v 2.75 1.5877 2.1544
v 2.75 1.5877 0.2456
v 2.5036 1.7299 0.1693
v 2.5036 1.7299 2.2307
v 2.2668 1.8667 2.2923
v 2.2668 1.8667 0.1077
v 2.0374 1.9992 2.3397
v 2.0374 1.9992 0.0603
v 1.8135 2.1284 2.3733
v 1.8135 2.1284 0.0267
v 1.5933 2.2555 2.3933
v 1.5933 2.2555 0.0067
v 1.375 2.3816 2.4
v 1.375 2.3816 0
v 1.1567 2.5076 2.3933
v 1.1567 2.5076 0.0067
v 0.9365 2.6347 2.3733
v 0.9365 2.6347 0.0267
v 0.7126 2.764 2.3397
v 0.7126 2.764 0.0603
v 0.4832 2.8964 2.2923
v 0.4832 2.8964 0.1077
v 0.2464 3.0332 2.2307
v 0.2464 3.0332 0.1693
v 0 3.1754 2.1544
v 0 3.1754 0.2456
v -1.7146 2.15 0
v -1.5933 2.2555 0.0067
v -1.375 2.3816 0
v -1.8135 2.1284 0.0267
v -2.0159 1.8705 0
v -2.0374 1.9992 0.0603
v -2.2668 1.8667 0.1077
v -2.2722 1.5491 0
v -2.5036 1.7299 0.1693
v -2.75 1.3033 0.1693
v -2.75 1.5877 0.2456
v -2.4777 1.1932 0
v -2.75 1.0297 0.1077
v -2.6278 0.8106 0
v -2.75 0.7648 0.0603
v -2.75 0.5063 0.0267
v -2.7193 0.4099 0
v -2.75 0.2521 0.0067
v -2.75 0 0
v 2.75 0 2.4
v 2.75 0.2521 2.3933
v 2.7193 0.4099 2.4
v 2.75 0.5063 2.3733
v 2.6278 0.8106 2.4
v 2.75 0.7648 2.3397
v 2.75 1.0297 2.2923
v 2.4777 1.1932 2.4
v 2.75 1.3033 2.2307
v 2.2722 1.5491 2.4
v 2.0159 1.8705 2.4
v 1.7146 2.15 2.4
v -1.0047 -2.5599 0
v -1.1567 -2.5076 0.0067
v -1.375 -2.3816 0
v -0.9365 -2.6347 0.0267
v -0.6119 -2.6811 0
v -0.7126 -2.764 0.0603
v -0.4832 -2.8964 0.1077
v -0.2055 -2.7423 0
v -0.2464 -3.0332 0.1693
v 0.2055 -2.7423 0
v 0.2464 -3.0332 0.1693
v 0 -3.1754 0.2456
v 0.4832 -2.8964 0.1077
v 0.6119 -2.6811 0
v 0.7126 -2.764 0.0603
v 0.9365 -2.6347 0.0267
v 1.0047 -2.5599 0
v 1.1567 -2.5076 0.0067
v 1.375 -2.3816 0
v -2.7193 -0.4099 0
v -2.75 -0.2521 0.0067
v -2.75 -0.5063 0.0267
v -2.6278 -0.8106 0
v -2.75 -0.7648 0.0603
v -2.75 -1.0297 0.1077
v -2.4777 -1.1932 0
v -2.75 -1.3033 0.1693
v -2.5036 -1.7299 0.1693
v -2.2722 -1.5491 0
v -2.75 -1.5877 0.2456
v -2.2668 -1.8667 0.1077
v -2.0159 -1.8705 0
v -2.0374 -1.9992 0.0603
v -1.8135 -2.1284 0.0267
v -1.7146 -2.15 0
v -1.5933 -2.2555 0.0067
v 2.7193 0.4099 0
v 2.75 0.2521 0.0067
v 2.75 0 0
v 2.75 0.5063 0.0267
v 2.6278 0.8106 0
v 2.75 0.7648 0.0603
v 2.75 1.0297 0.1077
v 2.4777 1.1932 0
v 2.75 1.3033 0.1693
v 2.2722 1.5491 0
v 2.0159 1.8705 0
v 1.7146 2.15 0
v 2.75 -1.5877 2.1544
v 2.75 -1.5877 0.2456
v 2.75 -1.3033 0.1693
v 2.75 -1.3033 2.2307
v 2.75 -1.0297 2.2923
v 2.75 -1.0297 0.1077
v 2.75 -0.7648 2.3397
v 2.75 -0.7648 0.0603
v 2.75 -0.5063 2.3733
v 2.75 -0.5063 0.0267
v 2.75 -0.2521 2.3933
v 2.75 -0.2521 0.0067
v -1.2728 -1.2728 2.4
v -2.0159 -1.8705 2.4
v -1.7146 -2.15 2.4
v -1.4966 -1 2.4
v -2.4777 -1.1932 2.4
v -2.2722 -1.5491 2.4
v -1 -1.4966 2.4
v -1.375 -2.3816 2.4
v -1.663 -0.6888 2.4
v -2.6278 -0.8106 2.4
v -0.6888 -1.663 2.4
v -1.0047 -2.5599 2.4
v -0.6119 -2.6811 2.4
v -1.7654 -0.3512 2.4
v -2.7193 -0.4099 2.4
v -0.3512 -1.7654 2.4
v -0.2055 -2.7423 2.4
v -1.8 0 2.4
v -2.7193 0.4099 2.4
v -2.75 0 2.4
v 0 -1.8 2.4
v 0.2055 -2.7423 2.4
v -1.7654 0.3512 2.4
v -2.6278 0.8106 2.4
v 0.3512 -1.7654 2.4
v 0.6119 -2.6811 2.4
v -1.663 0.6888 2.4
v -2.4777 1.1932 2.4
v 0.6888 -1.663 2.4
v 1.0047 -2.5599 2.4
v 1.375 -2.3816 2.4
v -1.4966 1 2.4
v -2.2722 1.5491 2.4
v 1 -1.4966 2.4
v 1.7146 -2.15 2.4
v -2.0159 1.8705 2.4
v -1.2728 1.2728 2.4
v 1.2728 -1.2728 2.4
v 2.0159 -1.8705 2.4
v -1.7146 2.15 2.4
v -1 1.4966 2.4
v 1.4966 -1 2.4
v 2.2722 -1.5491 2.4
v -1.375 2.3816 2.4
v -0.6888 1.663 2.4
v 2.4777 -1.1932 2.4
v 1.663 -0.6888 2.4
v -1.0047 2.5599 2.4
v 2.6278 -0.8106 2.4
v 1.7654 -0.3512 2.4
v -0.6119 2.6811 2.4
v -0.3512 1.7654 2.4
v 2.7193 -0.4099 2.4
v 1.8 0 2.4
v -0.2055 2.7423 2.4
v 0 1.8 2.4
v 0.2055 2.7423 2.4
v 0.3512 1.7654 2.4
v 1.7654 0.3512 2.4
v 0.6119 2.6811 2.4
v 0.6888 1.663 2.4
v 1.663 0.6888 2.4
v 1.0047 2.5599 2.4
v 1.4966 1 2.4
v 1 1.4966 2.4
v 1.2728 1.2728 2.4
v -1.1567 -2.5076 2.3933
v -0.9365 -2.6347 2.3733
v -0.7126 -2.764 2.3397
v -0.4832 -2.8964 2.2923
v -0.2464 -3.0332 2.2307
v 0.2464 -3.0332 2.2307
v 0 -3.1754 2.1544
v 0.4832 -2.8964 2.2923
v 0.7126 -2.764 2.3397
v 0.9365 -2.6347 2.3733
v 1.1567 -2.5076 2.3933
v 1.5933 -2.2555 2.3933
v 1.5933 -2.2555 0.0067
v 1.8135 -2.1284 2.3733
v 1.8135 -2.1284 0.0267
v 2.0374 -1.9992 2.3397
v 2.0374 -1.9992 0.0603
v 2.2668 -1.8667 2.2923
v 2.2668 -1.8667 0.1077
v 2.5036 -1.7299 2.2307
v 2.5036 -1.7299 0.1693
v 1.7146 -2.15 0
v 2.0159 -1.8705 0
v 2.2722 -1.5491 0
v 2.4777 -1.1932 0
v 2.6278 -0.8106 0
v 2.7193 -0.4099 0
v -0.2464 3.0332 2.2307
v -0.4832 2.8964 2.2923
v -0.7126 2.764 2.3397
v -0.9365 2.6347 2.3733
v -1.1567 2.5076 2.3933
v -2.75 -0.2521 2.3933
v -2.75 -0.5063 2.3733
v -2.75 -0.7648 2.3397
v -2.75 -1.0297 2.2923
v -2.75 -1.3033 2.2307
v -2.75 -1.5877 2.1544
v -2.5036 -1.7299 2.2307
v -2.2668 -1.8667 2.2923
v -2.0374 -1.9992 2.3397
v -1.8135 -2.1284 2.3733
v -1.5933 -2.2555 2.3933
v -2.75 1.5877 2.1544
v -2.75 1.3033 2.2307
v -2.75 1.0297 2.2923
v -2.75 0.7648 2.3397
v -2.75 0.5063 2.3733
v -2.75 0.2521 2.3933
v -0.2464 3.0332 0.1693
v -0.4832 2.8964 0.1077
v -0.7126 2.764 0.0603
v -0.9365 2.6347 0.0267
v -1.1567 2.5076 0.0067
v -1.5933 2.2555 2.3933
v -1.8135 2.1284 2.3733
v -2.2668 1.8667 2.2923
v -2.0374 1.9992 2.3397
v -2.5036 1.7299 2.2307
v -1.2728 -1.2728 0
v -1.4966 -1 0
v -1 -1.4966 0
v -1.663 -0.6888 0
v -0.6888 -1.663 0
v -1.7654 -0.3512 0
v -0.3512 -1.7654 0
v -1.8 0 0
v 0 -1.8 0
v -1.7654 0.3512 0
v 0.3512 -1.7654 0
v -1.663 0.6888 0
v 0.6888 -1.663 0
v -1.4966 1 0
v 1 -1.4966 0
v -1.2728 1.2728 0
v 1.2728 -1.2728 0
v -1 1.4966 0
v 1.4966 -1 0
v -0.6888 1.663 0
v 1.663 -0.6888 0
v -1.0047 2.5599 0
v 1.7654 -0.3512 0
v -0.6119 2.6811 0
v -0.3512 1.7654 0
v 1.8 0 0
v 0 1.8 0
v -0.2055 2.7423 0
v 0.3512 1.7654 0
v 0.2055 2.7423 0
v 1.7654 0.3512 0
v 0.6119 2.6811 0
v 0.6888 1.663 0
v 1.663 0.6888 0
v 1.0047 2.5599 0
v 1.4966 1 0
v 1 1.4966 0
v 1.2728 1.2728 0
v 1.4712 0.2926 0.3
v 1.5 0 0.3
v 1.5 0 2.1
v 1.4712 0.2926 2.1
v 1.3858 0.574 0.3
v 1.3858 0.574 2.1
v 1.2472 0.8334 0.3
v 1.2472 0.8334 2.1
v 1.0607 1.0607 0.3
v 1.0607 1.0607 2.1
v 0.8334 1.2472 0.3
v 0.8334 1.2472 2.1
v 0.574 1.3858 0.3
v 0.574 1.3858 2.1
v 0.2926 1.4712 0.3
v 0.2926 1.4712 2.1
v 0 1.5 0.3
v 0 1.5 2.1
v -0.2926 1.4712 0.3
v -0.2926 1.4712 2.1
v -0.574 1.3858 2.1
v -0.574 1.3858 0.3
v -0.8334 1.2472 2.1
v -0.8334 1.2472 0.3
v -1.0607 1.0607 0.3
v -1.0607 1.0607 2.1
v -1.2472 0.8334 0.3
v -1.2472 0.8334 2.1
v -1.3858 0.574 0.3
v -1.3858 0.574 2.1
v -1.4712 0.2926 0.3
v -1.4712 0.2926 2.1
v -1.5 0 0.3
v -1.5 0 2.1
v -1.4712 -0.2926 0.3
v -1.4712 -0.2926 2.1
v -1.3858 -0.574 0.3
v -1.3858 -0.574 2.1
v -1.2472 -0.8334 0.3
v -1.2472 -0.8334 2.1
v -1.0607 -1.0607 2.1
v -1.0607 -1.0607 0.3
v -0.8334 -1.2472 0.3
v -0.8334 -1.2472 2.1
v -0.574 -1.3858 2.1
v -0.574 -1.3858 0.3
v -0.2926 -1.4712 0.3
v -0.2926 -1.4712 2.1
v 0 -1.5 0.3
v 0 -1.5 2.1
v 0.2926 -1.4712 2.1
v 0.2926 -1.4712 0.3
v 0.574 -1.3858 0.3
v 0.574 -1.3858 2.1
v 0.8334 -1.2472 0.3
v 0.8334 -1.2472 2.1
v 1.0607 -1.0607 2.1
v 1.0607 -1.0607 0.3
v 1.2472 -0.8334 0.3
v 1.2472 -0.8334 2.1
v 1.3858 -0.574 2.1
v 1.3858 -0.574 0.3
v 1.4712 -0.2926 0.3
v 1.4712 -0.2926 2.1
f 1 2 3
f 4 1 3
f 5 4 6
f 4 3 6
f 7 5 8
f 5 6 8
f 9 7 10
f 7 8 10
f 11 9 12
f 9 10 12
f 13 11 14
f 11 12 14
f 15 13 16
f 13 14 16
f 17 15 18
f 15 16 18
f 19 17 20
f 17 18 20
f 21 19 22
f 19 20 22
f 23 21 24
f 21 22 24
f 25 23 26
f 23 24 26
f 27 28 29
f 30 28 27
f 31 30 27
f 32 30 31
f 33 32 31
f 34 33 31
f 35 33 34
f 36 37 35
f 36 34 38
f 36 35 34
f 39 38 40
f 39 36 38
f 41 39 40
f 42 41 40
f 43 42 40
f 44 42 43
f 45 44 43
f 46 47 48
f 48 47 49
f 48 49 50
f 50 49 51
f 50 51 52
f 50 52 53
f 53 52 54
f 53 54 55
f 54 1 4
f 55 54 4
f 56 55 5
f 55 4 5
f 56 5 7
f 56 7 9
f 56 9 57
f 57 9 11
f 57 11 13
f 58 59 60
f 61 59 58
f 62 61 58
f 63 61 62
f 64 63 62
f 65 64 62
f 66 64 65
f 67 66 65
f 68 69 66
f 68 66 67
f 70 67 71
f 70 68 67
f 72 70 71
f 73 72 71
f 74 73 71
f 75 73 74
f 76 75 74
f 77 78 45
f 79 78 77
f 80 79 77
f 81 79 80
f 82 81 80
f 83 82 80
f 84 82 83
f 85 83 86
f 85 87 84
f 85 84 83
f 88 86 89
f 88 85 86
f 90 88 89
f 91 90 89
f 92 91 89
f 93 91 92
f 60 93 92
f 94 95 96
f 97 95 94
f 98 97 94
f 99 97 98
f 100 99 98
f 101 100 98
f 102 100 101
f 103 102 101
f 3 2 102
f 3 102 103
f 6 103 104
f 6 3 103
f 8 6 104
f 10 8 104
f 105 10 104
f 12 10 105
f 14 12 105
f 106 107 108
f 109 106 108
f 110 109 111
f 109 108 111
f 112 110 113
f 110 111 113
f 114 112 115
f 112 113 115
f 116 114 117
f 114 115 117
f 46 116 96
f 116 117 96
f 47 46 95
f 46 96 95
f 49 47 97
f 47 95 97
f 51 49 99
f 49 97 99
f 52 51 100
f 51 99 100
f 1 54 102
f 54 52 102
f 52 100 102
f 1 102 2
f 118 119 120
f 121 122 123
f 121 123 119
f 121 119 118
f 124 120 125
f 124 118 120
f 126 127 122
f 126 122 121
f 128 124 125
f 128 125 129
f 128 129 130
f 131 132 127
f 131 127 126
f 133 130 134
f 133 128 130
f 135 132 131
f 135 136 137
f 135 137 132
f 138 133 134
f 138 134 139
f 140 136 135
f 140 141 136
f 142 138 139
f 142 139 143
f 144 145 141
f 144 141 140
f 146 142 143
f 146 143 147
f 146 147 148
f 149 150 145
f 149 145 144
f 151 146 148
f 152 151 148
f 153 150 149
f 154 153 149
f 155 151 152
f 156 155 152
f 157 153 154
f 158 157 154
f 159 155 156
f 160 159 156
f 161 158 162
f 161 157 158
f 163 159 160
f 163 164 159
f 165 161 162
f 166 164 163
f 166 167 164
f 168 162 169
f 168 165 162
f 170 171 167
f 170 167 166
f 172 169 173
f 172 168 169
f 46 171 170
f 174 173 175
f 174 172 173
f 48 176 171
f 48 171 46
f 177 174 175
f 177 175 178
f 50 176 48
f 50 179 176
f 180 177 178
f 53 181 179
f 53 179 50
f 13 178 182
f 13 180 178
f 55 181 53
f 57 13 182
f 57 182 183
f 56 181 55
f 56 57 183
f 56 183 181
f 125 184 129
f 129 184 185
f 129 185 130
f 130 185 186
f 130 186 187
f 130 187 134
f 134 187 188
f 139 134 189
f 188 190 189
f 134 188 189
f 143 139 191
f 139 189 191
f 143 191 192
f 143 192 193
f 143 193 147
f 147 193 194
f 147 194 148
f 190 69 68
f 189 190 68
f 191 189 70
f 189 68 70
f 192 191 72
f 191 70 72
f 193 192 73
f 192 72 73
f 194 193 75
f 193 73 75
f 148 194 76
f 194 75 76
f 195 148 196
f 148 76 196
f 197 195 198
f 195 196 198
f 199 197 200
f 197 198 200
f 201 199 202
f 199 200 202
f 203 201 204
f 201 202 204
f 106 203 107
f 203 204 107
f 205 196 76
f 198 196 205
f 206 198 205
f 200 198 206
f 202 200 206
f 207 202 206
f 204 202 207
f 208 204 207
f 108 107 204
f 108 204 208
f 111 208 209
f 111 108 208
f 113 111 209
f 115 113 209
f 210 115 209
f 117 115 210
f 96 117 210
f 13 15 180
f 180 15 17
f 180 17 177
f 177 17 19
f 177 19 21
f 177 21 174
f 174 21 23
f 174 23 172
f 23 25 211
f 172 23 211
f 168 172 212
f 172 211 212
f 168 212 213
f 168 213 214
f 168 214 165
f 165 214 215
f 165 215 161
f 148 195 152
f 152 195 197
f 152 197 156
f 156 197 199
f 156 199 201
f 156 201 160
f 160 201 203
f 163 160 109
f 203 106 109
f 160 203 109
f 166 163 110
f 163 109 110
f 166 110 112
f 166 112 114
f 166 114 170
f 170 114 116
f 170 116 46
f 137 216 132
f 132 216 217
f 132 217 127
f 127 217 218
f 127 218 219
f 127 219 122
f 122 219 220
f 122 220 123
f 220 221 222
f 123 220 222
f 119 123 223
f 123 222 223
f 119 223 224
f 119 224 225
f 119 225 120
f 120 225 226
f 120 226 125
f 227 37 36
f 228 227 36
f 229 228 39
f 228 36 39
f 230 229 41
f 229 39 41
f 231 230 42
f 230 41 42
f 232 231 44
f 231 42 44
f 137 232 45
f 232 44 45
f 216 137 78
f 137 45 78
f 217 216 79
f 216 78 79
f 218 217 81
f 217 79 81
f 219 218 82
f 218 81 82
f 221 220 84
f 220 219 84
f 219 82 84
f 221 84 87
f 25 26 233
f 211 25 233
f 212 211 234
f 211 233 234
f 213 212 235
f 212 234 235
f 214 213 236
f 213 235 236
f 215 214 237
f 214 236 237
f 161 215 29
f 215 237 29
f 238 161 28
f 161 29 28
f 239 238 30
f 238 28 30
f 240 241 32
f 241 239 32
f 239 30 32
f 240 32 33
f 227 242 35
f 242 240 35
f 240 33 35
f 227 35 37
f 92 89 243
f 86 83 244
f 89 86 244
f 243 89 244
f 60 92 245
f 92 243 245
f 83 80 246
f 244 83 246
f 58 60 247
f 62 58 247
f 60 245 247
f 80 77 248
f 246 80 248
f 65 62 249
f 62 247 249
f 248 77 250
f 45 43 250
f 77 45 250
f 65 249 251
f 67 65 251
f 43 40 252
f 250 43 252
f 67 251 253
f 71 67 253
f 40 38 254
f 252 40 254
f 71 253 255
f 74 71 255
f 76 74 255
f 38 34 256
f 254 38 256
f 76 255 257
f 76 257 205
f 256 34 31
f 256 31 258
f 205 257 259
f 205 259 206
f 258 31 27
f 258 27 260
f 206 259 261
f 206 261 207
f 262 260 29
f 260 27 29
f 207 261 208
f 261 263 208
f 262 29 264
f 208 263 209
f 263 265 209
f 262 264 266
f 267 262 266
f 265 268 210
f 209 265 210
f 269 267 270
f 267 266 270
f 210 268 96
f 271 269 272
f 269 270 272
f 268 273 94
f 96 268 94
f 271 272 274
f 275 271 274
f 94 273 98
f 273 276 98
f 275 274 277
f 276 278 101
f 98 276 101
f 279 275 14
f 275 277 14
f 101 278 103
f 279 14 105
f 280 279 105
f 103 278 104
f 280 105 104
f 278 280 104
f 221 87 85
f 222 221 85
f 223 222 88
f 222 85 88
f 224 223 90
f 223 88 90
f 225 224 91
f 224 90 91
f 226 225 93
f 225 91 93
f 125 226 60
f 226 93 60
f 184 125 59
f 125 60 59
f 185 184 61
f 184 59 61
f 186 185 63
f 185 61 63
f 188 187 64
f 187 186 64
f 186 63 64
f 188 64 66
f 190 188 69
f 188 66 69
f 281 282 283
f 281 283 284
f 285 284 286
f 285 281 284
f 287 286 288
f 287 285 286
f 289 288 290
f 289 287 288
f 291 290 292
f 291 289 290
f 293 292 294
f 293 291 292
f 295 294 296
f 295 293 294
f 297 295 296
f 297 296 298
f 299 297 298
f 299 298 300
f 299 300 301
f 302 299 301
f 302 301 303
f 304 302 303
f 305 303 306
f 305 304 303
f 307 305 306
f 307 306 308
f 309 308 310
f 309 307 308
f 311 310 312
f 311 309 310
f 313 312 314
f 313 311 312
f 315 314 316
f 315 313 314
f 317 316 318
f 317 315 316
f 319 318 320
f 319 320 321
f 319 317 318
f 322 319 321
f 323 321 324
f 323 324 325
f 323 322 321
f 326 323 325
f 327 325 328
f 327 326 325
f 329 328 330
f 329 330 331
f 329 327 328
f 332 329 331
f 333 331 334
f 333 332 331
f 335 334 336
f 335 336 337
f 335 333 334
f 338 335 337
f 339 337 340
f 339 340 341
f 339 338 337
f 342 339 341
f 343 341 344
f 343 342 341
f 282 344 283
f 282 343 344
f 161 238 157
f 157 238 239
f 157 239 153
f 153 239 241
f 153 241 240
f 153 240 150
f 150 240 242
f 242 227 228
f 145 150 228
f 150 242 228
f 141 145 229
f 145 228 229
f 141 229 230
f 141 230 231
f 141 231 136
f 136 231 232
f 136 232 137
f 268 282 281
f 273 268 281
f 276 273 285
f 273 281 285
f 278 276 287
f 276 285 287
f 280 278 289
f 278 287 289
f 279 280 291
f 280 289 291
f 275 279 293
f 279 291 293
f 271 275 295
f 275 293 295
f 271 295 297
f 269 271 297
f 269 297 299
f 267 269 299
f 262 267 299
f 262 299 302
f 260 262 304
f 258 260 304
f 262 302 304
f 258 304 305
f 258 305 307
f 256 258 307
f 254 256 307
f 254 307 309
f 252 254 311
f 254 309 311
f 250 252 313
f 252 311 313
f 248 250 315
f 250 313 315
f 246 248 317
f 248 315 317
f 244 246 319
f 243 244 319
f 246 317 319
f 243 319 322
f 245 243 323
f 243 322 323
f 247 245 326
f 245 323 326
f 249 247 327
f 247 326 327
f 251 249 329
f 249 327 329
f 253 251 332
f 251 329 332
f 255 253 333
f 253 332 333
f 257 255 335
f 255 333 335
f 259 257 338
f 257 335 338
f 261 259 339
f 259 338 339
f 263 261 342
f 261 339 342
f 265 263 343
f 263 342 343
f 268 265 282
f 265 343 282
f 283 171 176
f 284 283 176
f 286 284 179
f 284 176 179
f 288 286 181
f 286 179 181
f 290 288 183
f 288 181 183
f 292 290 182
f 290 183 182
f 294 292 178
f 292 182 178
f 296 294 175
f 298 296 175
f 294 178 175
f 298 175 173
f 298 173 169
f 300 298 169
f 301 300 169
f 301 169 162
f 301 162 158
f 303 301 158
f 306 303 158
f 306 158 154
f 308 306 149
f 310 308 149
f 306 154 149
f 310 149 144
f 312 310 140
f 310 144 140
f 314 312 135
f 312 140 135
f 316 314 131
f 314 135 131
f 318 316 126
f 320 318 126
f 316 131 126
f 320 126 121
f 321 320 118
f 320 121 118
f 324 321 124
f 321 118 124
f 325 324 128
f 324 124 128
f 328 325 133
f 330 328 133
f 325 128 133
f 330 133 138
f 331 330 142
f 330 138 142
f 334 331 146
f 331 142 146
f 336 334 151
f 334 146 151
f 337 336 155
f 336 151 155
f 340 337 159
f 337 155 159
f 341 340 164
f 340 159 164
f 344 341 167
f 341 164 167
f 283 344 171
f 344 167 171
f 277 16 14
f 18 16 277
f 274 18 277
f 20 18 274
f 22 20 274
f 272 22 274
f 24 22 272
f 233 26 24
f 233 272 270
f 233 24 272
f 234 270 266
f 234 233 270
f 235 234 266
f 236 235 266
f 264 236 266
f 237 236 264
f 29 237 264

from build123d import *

# Parameters (mm, degrees)
SKETCH1_R           = 3.75
SKETCH1_R_2         = 1.5
BOSS_EXTRUDE1_DEPTH = 2.4
CHAMFER1_SIZE       = 1
CHAMFER1_SIZE2      = 0.577350269
CHAMFER2_SIZE       = 1
CHAMFER2_SIZE2      = 0.577350269
SKETCH1_3_R         = 3.75
CUT_EXTRUDE1_DEPTH  = 6.821082374
CHAMFER3_SIZE       = 0.3


with BuildPart() as part:
    # Sketch1 → Boss-Extrude1 (new body)
    with BuildSketch(Plane.XY):
        Circle(SKETCH1_R)
        Circle(SKETCH1_R_2, mode=Mode.SUBTRACT)
    extrude(amount=BOSS_EXTRUDE1_DEPTH)

    # Chamfer1
    chamfer1_edges = [part.edges().sort_by_distance(p)[0] for p in [
        (-3.75, 0, 2.4),
    ]]
    chamfer1_side = [part.faces().sort_by_distance(p)[0] for p in [
        (-3.643933983, 0, 2.4),
    ]]
    chamfer(chamfer1_edges, length=CHAMFER1_SIZE, length2=CHAMFER1_SIZE2, reference=chamfer1_side[0])

    # Chamfer2
    chamfer2_edges = [part.edges().sort_by_distance(p)[0] for p in [
        (-3.75, 0, 0),
    ]]
    chamfer2_side = [part.faces().sort_by_distance(p)[0] for p in [
        (-3.643933983, 0, 0),
    ]]
    chamfer(chamfer2_edges, length=CHAMFER2_SIZE, length2=CHAMFER2_SIZE2, reference=chamfer2_side[0])

    # Sketch1<3> → Cut-Extrude1 (cut, through all)
    with BuildSketch(Plane.XY):
        Circle(SKETCH1_3_R)
        Polygon((-2.75, 1.58771324), (0, 3.175426481), (2.75, 1.58771324), (2.75, -1.58771324), (0, -3.175426481), (-2.75, -1.58771324), align=None, mode=Mode.SUBTRACT)
    extrude(amount=CUT_EXTRUDE1_DEPTH, mode=Mode.SUBTRACT)

    # Chamfer3
    chamfer3_edges = [part.edges().sort_by_distance(p)[0] for p in [
        (-1.5, 0, 0),
        (-1.5, 0, 2.4),
    ]]
    chamfer(chamfer3_edges, length=CHAMFER3_SIZE)


solid = part.part
